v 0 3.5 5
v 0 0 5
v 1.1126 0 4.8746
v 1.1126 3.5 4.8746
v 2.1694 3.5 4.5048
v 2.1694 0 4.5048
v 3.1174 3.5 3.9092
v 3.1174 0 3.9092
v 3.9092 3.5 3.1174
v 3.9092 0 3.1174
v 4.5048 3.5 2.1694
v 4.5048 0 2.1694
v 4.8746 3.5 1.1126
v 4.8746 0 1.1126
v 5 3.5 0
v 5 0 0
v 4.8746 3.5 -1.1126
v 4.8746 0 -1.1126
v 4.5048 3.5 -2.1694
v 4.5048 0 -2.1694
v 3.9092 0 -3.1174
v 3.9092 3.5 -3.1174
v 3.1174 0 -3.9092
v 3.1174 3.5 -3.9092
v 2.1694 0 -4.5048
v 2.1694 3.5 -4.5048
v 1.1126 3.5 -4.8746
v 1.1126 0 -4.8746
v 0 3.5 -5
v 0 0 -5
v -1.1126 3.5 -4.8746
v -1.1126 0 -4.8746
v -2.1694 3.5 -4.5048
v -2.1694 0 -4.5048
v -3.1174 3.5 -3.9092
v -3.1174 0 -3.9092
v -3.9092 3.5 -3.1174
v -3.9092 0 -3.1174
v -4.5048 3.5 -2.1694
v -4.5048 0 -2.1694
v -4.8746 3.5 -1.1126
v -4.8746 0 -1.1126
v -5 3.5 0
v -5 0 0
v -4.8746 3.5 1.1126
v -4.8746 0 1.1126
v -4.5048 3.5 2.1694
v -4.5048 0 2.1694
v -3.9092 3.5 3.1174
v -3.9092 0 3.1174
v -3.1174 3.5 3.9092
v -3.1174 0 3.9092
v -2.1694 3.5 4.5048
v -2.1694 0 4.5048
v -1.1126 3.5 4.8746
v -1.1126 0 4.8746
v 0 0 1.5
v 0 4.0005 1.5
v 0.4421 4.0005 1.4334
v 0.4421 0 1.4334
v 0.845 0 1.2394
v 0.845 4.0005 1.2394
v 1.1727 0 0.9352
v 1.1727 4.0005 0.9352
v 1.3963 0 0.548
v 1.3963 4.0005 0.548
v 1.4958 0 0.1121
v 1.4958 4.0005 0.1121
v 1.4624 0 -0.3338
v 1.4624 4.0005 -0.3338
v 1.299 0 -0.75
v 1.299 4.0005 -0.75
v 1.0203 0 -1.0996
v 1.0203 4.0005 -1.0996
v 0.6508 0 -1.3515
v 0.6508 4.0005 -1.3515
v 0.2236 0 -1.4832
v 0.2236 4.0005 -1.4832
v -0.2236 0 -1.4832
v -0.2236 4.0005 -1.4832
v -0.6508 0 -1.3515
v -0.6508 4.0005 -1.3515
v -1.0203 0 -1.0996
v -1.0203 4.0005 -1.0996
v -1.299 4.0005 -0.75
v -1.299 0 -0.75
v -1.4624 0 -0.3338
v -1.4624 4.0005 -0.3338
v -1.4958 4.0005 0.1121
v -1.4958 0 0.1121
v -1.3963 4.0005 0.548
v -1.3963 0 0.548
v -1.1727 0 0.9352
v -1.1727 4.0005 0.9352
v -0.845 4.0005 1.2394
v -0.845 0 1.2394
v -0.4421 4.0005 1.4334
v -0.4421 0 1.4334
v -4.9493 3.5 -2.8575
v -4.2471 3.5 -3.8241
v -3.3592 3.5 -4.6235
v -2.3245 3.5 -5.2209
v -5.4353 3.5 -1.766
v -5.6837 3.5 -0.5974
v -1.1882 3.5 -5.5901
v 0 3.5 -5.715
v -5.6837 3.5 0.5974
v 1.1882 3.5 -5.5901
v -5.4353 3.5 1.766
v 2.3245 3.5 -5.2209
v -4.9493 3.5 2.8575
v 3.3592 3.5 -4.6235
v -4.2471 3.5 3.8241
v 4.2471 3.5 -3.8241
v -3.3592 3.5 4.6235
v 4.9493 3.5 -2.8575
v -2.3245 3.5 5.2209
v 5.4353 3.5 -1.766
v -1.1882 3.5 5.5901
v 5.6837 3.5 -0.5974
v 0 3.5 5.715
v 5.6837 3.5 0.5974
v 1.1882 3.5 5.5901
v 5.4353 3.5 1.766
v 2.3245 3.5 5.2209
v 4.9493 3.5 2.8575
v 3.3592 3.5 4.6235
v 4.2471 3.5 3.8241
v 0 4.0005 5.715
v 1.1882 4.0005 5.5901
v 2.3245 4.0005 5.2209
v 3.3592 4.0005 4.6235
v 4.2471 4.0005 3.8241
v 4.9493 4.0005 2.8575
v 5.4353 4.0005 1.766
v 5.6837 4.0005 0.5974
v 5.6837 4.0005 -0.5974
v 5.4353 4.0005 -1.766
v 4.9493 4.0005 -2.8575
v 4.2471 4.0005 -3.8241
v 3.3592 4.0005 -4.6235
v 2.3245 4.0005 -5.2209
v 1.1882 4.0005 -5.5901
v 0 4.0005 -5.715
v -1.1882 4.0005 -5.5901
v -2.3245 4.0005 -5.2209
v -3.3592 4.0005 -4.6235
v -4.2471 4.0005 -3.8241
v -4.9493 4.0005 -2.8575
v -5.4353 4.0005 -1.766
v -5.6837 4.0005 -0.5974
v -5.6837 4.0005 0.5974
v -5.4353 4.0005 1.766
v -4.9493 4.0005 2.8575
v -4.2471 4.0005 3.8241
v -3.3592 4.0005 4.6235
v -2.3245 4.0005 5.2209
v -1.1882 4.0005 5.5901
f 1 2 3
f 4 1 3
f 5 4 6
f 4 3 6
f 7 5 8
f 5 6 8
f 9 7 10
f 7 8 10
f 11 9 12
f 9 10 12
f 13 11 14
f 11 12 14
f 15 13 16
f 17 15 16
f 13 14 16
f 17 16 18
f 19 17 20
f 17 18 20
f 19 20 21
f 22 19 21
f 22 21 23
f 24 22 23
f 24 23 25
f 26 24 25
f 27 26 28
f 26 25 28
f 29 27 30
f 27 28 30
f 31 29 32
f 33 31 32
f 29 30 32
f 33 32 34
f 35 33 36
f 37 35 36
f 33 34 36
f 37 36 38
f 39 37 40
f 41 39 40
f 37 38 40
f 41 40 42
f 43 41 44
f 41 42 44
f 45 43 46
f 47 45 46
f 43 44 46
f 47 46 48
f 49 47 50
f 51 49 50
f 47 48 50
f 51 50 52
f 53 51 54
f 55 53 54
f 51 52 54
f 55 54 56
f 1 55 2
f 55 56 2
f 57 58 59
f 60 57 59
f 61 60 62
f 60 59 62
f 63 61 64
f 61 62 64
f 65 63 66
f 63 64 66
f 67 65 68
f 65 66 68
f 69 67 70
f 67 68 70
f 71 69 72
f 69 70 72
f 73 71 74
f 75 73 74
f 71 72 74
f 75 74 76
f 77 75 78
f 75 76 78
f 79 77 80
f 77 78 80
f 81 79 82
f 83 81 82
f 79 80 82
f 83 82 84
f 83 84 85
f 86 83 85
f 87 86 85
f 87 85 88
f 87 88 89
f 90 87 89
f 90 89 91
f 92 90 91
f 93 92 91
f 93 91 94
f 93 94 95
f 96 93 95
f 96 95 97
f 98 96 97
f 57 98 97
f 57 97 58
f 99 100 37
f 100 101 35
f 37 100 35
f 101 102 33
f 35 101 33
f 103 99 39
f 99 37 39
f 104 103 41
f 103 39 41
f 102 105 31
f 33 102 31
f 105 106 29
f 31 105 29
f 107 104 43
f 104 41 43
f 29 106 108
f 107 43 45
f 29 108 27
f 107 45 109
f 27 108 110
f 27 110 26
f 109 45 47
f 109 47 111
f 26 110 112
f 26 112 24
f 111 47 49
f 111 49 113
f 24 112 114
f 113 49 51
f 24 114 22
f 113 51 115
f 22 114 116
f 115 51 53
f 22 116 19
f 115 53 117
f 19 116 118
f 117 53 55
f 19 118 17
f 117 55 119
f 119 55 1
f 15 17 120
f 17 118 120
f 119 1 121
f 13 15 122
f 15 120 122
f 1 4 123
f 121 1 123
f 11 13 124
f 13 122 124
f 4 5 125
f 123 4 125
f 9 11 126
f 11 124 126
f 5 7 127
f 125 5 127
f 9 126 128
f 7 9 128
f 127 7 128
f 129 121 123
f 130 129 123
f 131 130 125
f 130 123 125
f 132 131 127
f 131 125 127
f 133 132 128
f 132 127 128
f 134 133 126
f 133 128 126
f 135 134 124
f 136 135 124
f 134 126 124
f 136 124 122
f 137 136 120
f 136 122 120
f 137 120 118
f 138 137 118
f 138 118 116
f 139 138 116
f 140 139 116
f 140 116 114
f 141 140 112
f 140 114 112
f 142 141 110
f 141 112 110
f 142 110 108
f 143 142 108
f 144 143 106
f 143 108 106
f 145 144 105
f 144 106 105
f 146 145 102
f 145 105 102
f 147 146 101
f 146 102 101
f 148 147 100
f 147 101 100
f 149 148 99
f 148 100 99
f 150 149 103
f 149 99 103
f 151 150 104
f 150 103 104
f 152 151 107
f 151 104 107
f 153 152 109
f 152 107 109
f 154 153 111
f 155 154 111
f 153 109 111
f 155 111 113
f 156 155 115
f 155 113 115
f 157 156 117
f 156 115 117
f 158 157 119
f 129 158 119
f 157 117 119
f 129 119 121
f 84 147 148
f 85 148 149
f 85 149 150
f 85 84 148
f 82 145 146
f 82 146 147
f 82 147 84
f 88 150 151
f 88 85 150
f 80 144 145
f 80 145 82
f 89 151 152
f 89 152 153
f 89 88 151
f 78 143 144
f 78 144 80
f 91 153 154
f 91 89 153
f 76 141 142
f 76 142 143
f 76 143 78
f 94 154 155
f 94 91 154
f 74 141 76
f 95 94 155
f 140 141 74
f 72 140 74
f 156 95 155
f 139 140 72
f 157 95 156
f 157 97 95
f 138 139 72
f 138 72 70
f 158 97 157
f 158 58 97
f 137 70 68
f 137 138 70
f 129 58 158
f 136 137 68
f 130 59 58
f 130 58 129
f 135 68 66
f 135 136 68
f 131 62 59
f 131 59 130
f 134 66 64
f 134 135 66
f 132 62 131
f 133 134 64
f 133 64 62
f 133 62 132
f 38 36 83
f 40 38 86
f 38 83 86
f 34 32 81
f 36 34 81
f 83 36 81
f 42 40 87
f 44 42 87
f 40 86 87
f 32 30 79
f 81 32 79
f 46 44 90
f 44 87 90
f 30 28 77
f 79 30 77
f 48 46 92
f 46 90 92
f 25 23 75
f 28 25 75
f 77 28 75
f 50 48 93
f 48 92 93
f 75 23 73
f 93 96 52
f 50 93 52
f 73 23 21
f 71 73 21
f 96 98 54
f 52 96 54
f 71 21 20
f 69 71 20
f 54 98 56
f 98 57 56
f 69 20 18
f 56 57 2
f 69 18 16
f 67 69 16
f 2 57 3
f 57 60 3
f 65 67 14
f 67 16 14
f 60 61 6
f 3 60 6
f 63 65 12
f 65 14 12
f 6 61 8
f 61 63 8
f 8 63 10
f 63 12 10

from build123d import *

# Parameters (mm, degrees)
SKETCH1_R           = 5
BOSS_EXTRUDE1_DEPTH = 3.499993
SKETCH2_R           = 5.715
BOSS_EXTRUDE2_DEPTH = 0.500507
CUT_EXTRUDE1_REACH  = 11.018
SKETCH3_R           = 1.5


with BuildPart() as part:
    # Sketch1 → Boss-Extrude1 (new body)
    with BuildSketch(Plane(origin=(0, 0, 0), x_dir=(1, 0, 0), z_dir=(0, 1, 0))):
        with Locations(Location((0, 0, 0), (0, 0, 270))):
            Circle(SKETCH1_R)
    extrude(amount=BOSS_EXTRUDE1_DEPTH)

    # Sketch2 → Boss-Extrude2 (add)
    with BuildSketch(Plane(origin=(0, 3.499993, 0), x_dir=(1, 0, 0), z_dir=(0, 1, 0))):
        with Locations(Location((0, 0, 0), (0, 0, 270))):
            Circle(SKETCH2_R)
    extrude(amount=BOSS_EXTRUDE2_DEPTH)

    # Sketch3 → Cut-Extrude1 (cut, up to next)
    with BuildSketch(Plane(origin=(0, 4.0005, 0), x_dir=(1, 0, 0), z_dir=(0, 1, 0)), mode=Mode.PRIVATE) as cut_extrude1_sk1:
        with Locations(Location((0, 0, 0), (0, 0, 270))):
            Circle(SKETCH3_R)
    cut_extrude1_tool1 = extrude(cut_extrude1_sk1.sketch, amount=-CUT_EXTRUDE1_REACH, mode=Mode.PRIVATE) & part.part
    add(cut_extrude1_tool1.solids().sort_by_distance((0, 4.0005, 0))[0], mode=Mode.SUBTRACT)


solid = part.part
